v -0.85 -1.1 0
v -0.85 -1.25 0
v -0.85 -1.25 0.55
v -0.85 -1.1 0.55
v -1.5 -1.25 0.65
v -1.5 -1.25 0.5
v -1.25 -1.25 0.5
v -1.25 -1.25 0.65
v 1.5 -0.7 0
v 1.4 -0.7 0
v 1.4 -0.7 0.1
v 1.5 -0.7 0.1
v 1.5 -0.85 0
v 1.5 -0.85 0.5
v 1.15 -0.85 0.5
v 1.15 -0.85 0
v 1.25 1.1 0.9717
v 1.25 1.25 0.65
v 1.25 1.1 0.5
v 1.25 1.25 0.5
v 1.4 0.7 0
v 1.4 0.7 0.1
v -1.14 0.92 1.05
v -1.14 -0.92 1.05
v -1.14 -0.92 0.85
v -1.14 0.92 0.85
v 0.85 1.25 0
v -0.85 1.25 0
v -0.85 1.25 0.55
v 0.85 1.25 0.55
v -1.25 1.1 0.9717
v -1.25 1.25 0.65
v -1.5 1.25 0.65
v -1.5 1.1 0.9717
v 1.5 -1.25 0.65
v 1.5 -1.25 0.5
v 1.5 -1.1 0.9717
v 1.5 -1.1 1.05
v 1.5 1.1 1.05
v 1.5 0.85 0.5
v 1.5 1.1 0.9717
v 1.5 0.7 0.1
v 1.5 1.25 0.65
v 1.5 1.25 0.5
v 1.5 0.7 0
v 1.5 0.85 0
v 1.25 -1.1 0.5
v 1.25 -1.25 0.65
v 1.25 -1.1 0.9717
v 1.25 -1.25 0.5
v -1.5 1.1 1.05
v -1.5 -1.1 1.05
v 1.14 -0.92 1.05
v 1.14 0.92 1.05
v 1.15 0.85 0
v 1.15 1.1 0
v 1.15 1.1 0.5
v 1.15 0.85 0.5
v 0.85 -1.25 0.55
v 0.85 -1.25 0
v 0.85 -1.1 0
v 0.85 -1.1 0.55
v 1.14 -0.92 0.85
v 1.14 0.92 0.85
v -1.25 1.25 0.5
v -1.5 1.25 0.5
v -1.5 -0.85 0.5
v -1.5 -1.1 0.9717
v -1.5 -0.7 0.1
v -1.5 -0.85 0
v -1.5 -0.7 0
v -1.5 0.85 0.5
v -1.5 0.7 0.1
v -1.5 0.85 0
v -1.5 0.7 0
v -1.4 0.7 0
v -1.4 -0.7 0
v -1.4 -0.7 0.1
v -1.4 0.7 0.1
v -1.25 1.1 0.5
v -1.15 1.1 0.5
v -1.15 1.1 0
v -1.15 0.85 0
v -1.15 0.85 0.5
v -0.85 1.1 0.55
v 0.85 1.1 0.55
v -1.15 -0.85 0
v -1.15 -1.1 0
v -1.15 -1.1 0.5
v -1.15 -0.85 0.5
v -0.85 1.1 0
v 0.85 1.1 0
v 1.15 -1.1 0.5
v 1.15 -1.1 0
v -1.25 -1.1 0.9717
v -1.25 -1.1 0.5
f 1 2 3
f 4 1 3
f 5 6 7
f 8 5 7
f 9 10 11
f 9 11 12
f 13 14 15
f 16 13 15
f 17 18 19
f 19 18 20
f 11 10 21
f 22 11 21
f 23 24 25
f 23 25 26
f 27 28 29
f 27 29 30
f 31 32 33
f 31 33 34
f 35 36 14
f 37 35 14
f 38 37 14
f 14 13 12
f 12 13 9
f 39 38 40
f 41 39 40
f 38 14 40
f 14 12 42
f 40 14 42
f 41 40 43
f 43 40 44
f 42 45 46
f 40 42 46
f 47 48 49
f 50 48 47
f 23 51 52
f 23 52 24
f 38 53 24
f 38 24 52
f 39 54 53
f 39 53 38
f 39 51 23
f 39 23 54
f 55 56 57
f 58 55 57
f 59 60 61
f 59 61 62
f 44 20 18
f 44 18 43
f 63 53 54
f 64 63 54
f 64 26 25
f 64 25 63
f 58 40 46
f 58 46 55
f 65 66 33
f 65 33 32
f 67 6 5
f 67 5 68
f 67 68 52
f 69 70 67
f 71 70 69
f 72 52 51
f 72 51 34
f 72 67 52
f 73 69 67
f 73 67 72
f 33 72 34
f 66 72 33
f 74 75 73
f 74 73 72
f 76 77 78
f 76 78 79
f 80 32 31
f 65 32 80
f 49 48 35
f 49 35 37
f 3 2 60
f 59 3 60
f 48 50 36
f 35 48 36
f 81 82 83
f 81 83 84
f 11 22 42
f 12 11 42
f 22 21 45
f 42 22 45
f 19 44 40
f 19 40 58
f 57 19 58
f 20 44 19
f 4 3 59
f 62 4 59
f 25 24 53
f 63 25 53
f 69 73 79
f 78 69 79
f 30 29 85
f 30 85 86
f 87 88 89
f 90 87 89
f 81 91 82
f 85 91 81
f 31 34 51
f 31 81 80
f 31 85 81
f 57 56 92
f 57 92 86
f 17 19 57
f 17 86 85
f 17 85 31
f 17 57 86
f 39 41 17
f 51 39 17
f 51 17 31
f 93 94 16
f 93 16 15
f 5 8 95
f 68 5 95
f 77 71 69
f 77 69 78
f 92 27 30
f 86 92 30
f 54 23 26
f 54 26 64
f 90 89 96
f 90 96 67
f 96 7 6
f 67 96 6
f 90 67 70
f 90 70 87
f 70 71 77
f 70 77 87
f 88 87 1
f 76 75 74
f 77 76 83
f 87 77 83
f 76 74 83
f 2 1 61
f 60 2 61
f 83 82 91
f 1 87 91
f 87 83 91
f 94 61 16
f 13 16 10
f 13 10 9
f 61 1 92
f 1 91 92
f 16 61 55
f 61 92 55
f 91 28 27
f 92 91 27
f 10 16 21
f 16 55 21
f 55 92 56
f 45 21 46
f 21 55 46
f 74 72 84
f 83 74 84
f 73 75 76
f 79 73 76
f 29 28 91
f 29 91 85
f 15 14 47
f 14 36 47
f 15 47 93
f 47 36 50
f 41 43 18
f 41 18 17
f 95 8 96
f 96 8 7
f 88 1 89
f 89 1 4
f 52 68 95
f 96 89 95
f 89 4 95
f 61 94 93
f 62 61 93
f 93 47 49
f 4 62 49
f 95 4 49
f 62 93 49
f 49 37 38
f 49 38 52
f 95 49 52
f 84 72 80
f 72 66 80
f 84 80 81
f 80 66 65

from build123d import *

# Parameters (mm, degrees)
SKETCH028_W                   = 3
SKETCH028_H                   = 2.5
PAD017_DEPTH                  = 1.05
POCKET010_DEPTH               = 0.15
SKETCH031_W                   = 0.35
SKETCH031_H                   = 0.5
POCKET012_DEPTH               = 0.25
POCKET010_MIRRORED012_2_DEPTH = 0.15
SKETCH031_MIRRORED012_2_W     = 0.35
SKETCH031_MIRRORED012_2_H     = 0.5
POCKET012_MIRRORED012_2_DEPTH = 0.25
POCKET011_DEPTH               = 9.588645
POCKET011_DEPTH_BACK          = 9.588645
SKETCH039_W                   = 0.1
SKETCH039_H                   = 1.4
POCKET013_DEPTH               = 0.1
SKETCH040_W                   = 2.28
SKETCH040_H                   = 1.84
POCKET014_DEPTH               = 0.2


with BuildPart() as part:
    # Sketch028 → Pad017 (new body)
    with BuildSketch(Plane.XY):
        Rectangle(SKETCH028_W, SKETCH028_H)
    extrude(amount=PAD017_DEPTH)

    # Sketch029 (on Face1 of Pad017) → Pocket010 (cut)
    with BuildSketch(Plane.XZ.offset(1.25)):
        Polygon((-1.5, 0), (-0.85, 0), (-0.85, 0.55), (0, 0.55), (0, 1.05), (-1.25, 1.05), (-1.25, 0.5), (-1.5, 0.5), align=None)
    pocket010 = extrude(amount=-POCKET010_DEPTH, mode=Mode.SUBTRACT)

    # Sketch031 (on Face8 of Pocket010) → Pocket012 (cut)
    with BuildSketch(Plane.XZ.offset(1.1)):
        with Locations((-1.325, 0.25)):
            Rectangle(SKETCH031_W, SKETCH031_H)
    pocket012 = extrude(amount=-POCKET012_DEPTH, mode=Mode.SUBTRACT)

    # Sketch029 Mirrored012 2 → Pocket010 Mirrored012 2 (cut)
    with BuildSketch(Plane(origin=(0, -1.25, 0), x_dir=(-1, 0, 0), z_dir=(0, 1, 0))):
        Polygon((-1.5, 0), (-0.85, 0), (-0.85, 0.55), (0, 0.55), (0, 1.05), (-1.25, 1.05), (-1.25, 0.5), (-1.5, 0.5), align=None)
    pocket010_mirrored012_2 = extrude(amount=POCKET010_MIRRORED012_2_DEPTH, mode=Mode.SUBTRACT)

    # Sketch031 Mirrored012 2 → Pocket012 Mirrored012 2 (cut)
    with BuildSketch(Plane(origin=(0, -1.1, 0), x_dir=(-1, 0, 0), z_dir=(0, 1, 0))):
        with Locations((-1.325, 0.25)):
            Rectangle(SKETCH031_MIRRORED012_2_W, SKETCH031_MIRRORED012_2_H)
    pocket012_mirrored012_2 = extrude(amount=POCKET012_MIRRORED012_2_DEPTH, mode=Mode.SUBTRACT)

    # Mirrored013: Pocket010, Pocket012, Pocket010 Mirrored012 2, Pocket012 Mirrored012 2 across XZ
    add(pocket010.mirror(Plane.XZ), mode=Mode.SUBTRACT)
    add(pocket012.mirror(Plane.XZ), mode=Mode.SUBTRACT)
    add(pocket010_mirrored012_2.mirror(Plane.XZ), mode=Mode.SUBTRACT)
    add(pocket012_mirrored012_2.mirror(Plane.XZ), mode=Mode.SUBTRACT)

    # Sketch030 → Pocket011 (cut, two sides)
    with BuildSketch(Plane.YZ) as pocket011_sk:
        Polygon((-1.1, 1.05), (-1.25, 1.05), (-1.25, 0.65), (-1.1, 0.971676), align=None)
    pocket011 = extrude(amount=-POCKET011_DEPTH, mode=Mode.SUBTRACT) + extrude(pocket011_sk.sketch, amount=POCKET011_DEPTH_BACK, mode=Mode.SUBTRACT)

    # Mirrored014: Pocket011 across Sketch030 V_Axis
    add(pocket011.mirror(Plane(origin=(0, 0, 0), x_dir=(1, 0, 0), z_dir=(0, 1, 0))), mode=Mode.SUBTRACT)

    # Sketch039 → Pocket013 (cut)
    with BuildSketch(Plane.XY):
        with Locations((1.45, 0)):
            Rectangle(SKETCH039_W, SKETCH039_H)
        with Locations((-1.45, 0)):
            Rectangle(SKETCH039_W, SKETCH039_H)
    extrude(amount=POCKET013_DEPTH, mode=Mode.SUBTRACT)

    # Sketch040 (on Face14 of Pocket013) → Pocket014 (cut)
    with BuildSketch(Plane.XY.offset(1.05)):
        Rectangle(SKETCH040_W, SKETCH040_H)
    extrude(amount=-POCKET014_DEPTH, mode=Mode.SUBTRACT)


solid = part.part
